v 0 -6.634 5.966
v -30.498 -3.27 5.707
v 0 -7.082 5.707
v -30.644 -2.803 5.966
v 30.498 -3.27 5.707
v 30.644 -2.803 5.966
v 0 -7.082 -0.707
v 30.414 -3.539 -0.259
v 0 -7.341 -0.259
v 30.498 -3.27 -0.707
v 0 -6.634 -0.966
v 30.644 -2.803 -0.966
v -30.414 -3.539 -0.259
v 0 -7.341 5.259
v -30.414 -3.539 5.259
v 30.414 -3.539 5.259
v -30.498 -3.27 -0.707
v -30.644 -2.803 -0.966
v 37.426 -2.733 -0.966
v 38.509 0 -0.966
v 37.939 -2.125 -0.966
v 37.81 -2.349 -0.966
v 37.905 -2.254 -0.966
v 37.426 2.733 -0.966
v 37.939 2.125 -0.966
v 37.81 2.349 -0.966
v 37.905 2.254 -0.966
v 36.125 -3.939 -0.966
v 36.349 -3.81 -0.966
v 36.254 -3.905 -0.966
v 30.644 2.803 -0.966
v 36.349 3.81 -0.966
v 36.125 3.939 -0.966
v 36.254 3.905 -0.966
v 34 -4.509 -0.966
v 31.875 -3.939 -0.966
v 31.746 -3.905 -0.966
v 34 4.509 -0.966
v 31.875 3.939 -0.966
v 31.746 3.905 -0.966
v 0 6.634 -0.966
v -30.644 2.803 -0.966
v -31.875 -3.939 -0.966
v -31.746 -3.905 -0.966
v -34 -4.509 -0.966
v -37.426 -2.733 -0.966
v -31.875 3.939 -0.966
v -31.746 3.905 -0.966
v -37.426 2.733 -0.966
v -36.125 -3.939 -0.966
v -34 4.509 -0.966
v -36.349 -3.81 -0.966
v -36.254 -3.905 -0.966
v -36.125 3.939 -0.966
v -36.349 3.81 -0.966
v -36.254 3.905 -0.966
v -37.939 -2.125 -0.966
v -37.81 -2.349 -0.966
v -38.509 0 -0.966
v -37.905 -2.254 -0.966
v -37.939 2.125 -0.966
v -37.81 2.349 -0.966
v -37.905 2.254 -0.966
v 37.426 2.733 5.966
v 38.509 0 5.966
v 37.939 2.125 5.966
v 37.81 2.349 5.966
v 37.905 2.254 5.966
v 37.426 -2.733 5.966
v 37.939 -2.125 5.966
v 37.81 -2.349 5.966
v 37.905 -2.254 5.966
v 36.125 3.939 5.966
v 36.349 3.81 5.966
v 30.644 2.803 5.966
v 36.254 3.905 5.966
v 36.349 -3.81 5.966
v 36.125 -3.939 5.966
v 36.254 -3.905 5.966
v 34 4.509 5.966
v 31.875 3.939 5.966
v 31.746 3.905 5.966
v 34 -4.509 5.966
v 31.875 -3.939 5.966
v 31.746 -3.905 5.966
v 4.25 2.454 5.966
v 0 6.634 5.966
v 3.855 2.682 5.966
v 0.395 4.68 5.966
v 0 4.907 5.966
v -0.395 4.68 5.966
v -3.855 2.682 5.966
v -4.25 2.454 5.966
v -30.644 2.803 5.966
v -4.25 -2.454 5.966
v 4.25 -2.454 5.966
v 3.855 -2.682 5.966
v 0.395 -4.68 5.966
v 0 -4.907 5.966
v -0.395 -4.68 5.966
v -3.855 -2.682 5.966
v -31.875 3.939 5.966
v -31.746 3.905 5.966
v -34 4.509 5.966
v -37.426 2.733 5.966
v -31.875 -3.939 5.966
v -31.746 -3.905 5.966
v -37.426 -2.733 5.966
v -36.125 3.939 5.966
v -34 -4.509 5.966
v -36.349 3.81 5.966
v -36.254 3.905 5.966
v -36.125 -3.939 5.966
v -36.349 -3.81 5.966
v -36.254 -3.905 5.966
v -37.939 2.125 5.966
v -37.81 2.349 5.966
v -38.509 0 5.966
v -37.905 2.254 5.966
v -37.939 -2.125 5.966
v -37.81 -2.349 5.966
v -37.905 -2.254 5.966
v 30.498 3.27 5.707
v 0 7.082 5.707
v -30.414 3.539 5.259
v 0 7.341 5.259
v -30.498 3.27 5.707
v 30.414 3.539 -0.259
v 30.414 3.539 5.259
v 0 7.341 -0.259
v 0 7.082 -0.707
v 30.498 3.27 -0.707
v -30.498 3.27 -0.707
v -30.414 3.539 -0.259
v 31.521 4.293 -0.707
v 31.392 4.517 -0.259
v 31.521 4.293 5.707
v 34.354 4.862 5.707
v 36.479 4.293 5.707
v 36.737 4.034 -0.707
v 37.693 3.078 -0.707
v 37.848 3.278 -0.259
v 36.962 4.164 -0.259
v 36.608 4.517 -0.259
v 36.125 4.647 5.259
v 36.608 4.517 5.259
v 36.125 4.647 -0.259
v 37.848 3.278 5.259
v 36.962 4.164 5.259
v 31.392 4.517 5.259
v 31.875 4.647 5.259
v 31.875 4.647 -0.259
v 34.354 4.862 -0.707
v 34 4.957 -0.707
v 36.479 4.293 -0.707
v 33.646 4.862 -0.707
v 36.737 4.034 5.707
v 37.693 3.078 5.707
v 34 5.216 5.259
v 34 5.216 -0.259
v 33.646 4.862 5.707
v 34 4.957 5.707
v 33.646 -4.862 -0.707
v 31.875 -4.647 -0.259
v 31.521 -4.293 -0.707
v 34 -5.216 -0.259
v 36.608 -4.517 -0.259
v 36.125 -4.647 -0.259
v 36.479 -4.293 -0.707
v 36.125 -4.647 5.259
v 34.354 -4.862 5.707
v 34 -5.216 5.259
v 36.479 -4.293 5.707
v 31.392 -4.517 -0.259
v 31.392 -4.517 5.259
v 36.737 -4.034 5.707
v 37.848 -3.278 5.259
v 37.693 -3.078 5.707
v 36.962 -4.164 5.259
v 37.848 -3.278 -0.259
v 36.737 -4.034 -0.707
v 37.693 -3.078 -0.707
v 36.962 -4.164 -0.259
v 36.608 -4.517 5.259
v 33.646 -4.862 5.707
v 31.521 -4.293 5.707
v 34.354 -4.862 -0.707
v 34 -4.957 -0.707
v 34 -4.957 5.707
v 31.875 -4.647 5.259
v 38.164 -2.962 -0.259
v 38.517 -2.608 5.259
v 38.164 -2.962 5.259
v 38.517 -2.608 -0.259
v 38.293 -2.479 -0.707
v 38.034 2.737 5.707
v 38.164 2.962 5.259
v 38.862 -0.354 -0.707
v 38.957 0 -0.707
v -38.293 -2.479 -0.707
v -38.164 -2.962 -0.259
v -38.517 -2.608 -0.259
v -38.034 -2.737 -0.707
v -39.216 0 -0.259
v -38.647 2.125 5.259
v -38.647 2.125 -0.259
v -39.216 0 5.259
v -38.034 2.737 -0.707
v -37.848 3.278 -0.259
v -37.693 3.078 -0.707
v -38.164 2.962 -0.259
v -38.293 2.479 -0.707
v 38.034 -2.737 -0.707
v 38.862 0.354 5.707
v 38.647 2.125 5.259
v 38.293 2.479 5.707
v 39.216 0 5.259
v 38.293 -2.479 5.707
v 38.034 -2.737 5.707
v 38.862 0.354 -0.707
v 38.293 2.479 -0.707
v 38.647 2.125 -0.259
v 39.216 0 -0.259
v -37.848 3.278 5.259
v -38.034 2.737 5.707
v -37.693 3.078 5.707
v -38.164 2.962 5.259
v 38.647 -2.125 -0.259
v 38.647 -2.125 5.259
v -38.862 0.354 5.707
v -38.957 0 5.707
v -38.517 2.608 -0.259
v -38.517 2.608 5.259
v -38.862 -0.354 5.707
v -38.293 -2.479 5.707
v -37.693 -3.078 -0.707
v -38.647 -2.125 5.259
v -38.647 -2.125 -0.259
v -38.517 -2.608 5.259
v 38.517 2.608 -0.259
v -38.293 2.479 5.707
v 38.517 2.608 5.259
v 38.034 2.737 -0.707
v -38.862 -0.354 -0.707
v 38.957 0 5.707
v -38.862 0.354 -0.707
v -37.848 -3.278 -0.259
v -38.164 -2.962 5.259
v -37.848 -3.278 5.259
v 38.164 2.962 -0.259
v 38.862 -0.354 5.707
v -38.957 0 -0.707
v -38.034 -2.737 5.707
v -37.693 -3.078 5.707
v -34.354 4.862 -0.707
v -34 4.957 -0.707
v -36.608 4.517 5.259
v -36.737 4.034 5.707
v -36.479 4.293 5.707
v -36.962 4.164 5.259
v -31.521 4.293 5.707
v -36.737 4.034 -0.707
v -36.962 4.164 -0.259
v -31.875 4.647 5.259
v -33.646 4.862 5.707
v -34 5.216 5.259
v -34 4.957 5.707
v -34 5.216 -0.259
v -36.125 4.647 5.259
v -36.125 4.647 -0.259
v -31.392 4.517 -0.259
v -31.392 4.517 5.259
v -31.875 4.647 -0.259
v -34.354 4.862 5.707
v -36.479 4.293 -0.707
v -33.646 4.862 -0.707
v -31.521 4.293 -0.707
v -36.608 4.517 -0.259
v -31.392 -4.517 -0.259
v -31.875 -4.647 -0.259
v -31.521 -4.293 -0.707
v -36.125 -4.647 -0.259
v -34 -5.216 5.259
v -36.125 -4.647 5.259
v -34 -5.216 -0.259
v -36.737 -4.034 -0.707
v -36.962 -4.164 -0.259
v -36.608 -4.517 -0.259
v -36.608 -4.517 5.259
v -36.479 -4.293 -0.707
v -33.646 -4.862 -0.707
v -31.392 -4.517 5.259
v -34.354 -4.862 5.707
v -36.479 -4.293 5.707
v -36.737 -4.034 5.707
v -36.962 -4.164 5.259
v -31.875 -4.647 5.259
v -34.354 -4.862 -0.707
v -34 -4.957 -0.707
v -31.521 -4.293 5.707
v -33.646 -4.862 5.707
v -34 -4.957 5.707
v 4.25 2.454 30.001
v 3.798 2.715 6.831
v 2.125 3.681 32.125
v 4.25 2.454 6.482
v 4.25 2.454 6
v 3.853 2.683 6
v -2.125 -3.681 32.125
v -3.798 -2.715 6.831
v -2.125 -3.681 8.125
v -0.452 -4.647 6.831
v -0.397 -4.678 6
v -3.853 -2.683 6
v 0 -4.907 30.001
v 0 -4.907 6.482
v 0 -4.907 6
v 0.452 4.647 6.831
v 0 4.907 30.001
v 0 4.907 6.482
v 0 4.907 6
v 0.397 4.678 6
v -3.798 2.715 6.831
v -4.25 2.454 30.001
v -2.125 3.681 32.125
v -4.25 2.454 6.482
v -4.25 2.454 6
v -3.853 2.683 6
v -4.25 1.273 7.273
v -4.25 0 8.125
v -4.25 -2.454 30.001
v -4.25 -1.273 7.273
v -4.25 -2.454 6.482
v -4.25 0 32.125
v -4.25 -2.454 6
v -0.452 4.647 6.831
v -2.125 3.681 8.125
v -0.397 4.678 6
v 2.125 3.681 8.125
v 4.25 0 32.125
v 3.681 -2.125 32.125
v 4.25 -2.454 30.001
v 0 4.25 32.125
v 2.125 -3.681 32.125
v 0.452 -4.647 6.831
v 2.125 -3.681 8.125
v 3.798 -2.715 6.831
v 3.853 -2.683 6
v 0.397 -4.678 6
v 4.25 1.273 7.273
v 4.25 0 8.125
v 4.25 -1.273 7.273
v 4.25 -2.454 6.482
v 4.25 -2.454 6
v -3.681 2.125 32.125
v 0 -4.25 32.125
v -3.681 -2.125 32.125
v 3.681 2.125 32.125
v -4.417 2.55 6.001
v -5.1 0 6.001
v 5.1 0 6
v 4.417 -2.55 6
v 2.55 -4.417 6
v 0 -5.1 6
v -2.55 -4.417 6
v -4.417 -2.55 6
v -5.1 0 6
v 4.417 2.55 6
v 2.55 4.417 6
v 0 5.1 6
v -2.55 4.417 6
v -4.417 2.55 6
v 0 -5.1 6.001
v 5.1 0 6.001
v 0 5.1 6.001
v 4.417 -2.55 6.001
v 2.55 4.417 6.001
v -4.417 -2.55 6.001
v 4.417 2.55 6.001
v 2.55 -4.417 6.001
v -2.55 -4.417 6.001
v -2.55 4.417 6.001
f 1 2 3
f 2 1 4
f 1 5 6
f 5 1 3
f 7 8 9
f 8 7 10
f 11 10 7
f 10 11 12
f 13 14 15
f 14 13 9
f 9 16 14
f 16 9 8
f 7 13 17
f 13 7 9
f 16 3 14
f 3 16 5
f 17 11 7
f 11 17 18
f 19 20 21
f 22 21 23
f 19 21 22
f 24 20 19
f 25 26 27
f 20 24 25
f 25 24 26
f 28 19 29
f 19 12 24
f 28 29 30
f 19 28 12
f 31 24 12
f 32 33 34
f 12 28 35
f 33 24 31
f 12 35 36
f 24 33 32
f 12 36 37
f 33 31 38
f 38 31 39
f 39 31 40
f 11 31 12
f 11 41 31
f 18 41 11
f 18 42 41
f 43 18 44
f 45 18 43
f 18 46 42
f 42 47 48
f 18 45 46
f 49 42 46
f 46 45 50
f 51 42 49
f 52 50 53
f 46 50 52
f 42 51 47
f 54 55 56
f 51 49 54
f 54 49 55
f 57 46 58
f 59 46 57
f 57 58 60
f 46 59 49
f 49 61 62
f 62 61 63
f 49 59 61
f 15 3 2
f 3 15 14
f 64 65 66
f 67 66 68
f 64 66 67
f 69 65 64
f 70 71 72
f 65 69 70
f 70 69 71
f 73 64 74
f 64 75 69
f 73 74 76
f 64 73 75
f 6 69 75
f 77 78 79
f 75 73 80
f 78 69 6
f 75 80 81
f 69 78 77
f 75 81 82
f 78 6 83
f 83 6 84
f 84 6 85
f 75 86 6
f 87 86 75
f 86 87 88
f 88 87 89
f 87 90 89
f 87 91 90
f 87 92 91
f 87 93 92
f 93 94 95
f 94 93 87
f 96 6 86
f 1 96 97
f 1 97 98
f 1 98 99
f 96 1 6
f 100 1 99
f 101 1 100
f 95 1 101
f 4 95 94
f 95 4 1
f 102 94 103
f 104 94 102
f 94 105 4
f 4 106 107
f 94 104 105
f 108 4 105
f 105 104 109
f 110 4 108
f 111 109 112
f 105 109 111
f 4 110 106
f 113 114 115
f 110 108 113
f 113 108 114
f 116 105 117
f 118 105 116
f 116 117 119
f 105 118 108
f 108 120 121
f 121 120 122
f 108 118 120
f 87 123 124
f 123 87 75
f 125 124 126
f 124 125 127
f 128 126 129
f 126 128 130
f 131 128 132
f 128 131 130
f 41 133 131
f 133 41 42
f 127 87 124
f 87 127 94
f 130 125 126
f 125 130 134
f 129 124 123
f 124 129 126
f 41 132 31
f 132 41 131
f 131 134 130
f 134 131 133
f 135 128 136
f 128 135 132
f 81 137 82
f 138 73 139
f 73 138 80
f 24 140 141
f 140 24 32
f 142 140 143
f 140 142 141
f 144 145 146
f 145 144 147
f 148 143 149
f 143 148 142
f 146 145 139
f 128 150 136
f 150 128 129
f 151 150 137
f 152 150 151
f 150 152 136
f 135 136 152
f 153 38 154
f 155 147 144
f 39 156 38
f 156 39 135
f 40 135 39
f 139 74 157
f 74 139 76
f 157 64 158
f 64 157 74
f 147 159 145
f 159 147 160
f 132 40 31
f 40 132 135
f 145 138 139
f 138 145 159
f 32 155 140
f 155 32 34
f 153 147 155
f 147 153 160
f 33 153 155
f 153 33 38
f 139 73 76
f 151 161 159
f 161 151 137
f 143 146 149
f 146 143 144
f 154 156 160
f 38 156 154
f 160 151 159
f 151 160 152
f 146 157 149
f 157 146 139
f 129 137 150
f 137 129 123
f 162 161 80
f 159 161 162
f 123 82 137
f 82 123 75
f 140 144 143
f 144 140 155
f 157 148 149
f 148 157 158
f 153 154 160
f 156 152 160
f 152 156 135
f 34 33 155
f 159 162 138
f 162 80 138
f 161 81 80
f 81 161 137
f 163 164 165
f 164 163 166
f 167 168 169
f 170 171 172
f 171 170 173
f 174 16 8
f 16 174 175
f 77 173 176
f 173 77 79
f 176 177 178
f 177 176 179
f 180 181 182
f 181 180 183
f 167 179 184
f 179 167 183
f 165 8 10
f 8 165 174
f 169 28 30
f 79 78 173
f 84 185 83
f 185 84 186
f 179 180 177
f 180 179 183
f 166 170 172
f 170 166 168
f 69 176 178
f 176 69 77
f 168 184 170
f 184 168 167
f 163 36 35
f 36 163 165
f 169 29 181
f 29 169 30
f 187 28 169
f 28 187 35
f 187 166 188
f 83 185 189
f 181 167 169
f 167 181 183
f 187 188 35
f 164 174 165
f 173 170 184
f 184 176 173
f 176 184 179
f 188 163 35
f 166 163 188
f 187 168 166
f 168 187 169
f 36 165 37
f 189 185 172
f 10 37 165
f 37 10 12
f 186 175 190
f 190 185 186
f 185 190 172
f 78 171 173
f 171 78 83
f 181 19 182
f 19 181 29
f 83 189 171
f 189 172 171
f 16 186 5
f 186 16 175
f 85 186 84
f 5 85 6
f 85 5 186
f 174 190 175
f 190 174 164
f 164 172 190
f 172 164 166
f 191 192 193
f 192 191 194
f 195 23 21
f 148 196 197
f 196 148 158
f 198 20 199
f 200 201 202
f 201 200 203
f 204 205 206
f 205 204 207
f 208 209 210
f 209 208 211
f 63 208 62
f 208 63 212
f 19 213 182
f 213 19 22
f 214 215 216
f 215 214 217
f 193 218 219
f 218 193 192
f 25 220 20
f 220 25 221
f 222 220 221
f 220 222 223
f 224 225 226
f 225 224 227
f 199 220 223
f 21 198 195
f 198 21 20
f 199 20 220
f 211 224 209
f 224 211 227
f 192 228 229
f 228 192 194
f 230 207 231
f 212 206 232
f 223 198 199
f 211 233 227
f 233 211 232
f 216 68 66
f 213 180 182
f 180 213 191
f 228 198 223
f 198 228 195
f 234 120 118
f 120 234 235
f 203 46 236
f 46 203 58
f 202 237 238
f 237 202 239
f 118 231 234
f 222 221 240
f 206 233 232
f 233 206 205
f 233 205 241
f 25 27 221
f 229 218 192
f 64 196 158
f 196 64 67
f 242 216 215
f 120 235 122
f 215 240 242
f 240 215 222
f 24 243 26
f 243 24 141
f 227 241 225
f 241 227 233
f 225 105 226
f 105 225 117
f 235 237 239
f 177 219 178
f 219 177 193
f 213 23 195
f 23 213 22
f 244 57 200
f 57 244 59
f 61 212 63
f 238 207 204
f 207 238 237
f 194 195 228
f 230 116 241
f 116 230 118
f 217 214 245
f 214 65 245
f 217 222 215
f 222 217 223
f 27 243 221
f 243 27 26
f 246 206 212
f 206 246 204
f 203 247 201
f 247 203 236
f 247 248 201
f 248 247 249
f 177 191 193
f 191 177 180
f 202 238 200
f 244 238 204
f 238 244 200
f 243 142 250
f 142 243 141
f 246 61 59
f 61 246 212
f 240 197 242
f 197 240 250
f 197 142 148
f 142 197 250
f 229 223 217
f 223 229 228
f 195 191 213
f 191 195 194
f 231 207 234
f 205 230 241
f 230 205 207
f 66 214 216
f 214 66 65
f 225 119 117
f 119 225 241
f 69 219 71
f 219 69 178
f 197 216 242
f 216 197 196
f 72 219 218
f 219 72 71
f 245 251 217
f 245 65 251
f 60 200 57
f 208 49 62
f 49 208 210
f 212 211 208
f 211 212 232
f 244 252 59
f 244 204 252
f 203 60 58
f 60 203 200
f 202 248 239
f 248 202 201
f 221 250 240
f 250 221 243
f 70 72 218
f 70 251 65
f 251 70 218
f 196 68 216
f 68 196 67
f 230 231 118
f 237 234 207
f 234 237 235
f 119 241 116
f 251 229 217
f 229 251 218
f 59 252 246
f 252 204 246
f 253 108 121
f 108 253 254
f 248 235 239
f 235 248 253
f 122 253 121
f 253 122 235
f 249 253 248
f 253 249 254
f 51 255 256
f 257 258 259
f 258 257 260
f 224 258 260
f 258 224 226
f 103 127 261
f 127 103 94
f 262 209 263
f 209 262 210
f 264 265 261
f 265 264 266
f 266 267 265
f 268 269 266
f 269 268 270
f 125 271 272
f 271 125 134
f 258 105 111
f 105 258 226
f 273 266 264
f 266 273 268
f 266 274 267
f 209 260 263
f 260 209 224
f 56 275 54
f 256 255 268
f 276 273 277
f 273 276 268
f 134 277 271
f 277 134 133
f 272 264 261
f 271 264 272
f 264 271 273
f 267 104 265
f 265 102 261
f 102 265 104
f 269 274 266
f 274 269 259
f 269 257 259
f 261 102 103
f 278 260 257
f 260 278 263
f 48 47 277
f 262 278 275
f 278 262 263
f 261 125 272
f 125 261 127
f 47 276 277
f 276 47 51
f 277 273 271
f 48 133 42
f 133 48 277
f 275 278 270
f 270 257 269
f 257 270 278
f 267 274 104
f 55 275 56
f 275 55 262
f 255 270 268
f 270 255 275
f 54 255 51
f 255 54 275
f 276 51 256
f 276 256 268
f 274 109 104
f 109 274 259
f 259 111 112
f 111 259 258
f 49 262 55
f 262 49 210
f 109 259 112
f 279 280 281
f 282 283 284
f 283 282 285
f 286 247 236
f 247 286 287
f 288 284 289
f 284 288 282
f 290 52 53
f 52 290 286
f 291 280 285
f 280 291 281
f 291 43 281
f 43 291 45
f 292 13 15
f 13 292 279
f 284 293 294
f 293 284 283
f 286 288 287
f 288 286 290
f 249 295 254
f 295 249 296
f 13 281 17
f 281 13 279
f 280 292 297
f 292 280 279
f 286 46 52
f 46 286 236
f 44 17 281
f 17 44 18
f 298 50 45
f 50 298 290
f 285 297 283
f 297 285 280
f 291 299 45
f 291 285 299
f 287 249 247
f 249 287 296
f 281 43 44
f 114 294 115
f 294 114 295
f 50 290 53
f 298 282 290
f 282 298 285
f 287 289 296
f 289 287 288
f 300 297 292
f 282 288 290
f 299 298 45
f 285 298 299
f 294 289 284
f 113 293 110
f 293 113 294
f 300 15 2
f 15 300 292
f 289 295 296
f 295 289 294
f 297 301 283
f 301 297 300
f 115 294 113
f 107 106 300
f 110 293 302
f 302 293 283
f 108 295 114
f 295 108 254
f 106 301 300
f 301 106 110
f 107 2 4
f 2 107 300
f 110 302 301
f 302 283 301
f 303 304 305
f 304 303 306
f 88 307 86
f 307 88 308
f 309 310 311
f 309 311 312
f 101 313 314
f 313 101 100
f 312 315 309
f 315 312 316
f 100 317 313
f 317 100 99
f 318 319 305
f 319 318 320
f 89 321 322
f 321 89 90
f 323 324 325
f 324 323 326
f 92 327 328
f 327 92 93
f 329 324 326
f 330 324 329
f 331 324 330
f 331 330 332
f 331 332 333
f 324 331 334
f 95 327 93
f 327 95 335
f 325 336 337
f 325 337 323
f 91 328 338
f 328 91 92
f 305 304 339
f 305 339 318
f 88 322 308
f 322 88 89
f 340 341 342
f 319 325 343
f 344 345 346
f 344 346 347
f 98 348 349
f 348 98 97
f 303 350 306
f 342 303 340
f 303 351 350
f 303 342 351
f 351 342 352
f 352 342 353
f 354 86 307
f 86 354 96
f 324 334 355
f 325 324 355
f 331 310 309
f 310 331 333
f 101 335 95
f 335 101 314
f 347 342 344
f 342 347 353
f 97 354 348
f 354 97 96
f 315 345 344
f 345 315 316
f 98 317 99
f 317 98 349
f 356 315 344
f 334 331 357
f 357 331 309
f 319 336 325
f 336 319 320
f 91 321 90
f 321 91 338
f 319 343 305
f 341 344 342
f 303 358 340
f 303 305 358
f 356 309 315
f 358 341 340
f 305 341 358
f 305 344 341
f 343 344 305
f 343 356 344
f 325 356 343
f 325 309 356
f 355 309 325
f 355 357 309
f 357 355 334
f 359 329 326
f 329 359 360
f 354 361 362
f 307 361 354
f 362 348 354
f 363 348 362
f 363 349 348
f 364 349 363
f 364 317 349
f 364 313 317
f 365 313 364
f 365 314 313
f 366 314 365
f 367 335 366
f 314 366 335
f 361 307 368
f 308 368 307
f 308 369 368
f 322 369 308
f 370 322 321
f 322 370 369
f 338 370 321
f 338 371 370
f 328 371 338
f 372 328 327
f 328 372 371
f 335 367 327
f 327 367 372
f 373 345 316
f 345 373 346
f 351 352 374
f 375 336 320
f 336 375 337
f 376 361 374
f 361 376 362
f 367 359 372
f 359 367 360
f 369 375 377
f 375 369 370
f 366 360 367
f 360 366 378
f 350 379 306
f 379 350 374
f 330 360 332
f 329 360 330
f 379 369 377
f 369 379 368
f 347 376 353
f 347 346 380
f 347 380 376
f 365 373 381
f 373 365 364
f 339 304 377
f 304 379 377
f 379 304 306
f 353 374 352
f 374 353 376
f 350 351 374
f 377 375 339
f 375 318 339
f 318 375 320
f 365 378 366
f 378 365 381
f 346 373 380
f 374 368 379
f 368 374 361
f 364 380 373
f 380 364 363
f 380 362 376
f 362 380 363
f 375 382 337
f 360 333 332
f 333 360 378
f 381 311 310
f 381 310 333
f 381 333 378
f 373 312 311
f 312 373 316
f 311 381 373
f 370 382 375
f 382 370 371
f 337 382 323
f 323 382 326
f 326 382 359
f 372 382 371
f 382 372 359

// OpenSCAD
hex_size = 8.5;
face_length = hex_size / sqrt(3);
post_height = 25;
handle_height = 5;
roundcorner = 2;

//$fn = 125;
$fn = 12;



hull() {
    translate([0, 0, ((post_height+handle_height) / 2) + 0.001]) {
        hull() {
            cube([hex_size, face_length, post_height + handle_height], center=true);
    
            rotate([0, 0, 120]) {
                cube([hex_size, face_length, post_height+handle_height], center=true);
            }
            rotate([0, 0, 240]) {
                cube([hex_size, face_length, post_height+handle_height], center=true);
            }
        }
    }
    translate([0, 0, post_height + handle_height]) {
        cylinder(h = (hex_size / 4), d = hex_size);
    }
        

}
hull() {
    translate([0, 0, handle_height +  + (roundcorner / 2)]) {
        cylinder(h = (hex_size / 4), d = hex_size);
    }
    translate([0, 0, handle_height + (roundcorner / 2)]) {
        cylinder(h = 0.001, d = hex_size * 1.2 );
    }
}




minkowski() {
        union() {
            hull() {
                cylinder(h = handle_height, d = hex_size * 1.5);
                translate([hex_size * 4, 0, 0]) {
                    cylinder(h = handle_height, d = hex_size * 1/2);
                }
                translate([hex_size * -4, 0, 0]) {
                    cylinder(h = handle_height, d = hex_size * 1/2);
                }

            }
            translate([hex_size * 4, 0, 0]) {
                cylinder(h = handle_height, d = hex_size);
            }
            translate([hex_size * -4, 0, 0]) {
                cylinder(h = handle_height, d = hex_size);
            }
        }
        
    sphere(r=roundcorner / 2);

}
  
